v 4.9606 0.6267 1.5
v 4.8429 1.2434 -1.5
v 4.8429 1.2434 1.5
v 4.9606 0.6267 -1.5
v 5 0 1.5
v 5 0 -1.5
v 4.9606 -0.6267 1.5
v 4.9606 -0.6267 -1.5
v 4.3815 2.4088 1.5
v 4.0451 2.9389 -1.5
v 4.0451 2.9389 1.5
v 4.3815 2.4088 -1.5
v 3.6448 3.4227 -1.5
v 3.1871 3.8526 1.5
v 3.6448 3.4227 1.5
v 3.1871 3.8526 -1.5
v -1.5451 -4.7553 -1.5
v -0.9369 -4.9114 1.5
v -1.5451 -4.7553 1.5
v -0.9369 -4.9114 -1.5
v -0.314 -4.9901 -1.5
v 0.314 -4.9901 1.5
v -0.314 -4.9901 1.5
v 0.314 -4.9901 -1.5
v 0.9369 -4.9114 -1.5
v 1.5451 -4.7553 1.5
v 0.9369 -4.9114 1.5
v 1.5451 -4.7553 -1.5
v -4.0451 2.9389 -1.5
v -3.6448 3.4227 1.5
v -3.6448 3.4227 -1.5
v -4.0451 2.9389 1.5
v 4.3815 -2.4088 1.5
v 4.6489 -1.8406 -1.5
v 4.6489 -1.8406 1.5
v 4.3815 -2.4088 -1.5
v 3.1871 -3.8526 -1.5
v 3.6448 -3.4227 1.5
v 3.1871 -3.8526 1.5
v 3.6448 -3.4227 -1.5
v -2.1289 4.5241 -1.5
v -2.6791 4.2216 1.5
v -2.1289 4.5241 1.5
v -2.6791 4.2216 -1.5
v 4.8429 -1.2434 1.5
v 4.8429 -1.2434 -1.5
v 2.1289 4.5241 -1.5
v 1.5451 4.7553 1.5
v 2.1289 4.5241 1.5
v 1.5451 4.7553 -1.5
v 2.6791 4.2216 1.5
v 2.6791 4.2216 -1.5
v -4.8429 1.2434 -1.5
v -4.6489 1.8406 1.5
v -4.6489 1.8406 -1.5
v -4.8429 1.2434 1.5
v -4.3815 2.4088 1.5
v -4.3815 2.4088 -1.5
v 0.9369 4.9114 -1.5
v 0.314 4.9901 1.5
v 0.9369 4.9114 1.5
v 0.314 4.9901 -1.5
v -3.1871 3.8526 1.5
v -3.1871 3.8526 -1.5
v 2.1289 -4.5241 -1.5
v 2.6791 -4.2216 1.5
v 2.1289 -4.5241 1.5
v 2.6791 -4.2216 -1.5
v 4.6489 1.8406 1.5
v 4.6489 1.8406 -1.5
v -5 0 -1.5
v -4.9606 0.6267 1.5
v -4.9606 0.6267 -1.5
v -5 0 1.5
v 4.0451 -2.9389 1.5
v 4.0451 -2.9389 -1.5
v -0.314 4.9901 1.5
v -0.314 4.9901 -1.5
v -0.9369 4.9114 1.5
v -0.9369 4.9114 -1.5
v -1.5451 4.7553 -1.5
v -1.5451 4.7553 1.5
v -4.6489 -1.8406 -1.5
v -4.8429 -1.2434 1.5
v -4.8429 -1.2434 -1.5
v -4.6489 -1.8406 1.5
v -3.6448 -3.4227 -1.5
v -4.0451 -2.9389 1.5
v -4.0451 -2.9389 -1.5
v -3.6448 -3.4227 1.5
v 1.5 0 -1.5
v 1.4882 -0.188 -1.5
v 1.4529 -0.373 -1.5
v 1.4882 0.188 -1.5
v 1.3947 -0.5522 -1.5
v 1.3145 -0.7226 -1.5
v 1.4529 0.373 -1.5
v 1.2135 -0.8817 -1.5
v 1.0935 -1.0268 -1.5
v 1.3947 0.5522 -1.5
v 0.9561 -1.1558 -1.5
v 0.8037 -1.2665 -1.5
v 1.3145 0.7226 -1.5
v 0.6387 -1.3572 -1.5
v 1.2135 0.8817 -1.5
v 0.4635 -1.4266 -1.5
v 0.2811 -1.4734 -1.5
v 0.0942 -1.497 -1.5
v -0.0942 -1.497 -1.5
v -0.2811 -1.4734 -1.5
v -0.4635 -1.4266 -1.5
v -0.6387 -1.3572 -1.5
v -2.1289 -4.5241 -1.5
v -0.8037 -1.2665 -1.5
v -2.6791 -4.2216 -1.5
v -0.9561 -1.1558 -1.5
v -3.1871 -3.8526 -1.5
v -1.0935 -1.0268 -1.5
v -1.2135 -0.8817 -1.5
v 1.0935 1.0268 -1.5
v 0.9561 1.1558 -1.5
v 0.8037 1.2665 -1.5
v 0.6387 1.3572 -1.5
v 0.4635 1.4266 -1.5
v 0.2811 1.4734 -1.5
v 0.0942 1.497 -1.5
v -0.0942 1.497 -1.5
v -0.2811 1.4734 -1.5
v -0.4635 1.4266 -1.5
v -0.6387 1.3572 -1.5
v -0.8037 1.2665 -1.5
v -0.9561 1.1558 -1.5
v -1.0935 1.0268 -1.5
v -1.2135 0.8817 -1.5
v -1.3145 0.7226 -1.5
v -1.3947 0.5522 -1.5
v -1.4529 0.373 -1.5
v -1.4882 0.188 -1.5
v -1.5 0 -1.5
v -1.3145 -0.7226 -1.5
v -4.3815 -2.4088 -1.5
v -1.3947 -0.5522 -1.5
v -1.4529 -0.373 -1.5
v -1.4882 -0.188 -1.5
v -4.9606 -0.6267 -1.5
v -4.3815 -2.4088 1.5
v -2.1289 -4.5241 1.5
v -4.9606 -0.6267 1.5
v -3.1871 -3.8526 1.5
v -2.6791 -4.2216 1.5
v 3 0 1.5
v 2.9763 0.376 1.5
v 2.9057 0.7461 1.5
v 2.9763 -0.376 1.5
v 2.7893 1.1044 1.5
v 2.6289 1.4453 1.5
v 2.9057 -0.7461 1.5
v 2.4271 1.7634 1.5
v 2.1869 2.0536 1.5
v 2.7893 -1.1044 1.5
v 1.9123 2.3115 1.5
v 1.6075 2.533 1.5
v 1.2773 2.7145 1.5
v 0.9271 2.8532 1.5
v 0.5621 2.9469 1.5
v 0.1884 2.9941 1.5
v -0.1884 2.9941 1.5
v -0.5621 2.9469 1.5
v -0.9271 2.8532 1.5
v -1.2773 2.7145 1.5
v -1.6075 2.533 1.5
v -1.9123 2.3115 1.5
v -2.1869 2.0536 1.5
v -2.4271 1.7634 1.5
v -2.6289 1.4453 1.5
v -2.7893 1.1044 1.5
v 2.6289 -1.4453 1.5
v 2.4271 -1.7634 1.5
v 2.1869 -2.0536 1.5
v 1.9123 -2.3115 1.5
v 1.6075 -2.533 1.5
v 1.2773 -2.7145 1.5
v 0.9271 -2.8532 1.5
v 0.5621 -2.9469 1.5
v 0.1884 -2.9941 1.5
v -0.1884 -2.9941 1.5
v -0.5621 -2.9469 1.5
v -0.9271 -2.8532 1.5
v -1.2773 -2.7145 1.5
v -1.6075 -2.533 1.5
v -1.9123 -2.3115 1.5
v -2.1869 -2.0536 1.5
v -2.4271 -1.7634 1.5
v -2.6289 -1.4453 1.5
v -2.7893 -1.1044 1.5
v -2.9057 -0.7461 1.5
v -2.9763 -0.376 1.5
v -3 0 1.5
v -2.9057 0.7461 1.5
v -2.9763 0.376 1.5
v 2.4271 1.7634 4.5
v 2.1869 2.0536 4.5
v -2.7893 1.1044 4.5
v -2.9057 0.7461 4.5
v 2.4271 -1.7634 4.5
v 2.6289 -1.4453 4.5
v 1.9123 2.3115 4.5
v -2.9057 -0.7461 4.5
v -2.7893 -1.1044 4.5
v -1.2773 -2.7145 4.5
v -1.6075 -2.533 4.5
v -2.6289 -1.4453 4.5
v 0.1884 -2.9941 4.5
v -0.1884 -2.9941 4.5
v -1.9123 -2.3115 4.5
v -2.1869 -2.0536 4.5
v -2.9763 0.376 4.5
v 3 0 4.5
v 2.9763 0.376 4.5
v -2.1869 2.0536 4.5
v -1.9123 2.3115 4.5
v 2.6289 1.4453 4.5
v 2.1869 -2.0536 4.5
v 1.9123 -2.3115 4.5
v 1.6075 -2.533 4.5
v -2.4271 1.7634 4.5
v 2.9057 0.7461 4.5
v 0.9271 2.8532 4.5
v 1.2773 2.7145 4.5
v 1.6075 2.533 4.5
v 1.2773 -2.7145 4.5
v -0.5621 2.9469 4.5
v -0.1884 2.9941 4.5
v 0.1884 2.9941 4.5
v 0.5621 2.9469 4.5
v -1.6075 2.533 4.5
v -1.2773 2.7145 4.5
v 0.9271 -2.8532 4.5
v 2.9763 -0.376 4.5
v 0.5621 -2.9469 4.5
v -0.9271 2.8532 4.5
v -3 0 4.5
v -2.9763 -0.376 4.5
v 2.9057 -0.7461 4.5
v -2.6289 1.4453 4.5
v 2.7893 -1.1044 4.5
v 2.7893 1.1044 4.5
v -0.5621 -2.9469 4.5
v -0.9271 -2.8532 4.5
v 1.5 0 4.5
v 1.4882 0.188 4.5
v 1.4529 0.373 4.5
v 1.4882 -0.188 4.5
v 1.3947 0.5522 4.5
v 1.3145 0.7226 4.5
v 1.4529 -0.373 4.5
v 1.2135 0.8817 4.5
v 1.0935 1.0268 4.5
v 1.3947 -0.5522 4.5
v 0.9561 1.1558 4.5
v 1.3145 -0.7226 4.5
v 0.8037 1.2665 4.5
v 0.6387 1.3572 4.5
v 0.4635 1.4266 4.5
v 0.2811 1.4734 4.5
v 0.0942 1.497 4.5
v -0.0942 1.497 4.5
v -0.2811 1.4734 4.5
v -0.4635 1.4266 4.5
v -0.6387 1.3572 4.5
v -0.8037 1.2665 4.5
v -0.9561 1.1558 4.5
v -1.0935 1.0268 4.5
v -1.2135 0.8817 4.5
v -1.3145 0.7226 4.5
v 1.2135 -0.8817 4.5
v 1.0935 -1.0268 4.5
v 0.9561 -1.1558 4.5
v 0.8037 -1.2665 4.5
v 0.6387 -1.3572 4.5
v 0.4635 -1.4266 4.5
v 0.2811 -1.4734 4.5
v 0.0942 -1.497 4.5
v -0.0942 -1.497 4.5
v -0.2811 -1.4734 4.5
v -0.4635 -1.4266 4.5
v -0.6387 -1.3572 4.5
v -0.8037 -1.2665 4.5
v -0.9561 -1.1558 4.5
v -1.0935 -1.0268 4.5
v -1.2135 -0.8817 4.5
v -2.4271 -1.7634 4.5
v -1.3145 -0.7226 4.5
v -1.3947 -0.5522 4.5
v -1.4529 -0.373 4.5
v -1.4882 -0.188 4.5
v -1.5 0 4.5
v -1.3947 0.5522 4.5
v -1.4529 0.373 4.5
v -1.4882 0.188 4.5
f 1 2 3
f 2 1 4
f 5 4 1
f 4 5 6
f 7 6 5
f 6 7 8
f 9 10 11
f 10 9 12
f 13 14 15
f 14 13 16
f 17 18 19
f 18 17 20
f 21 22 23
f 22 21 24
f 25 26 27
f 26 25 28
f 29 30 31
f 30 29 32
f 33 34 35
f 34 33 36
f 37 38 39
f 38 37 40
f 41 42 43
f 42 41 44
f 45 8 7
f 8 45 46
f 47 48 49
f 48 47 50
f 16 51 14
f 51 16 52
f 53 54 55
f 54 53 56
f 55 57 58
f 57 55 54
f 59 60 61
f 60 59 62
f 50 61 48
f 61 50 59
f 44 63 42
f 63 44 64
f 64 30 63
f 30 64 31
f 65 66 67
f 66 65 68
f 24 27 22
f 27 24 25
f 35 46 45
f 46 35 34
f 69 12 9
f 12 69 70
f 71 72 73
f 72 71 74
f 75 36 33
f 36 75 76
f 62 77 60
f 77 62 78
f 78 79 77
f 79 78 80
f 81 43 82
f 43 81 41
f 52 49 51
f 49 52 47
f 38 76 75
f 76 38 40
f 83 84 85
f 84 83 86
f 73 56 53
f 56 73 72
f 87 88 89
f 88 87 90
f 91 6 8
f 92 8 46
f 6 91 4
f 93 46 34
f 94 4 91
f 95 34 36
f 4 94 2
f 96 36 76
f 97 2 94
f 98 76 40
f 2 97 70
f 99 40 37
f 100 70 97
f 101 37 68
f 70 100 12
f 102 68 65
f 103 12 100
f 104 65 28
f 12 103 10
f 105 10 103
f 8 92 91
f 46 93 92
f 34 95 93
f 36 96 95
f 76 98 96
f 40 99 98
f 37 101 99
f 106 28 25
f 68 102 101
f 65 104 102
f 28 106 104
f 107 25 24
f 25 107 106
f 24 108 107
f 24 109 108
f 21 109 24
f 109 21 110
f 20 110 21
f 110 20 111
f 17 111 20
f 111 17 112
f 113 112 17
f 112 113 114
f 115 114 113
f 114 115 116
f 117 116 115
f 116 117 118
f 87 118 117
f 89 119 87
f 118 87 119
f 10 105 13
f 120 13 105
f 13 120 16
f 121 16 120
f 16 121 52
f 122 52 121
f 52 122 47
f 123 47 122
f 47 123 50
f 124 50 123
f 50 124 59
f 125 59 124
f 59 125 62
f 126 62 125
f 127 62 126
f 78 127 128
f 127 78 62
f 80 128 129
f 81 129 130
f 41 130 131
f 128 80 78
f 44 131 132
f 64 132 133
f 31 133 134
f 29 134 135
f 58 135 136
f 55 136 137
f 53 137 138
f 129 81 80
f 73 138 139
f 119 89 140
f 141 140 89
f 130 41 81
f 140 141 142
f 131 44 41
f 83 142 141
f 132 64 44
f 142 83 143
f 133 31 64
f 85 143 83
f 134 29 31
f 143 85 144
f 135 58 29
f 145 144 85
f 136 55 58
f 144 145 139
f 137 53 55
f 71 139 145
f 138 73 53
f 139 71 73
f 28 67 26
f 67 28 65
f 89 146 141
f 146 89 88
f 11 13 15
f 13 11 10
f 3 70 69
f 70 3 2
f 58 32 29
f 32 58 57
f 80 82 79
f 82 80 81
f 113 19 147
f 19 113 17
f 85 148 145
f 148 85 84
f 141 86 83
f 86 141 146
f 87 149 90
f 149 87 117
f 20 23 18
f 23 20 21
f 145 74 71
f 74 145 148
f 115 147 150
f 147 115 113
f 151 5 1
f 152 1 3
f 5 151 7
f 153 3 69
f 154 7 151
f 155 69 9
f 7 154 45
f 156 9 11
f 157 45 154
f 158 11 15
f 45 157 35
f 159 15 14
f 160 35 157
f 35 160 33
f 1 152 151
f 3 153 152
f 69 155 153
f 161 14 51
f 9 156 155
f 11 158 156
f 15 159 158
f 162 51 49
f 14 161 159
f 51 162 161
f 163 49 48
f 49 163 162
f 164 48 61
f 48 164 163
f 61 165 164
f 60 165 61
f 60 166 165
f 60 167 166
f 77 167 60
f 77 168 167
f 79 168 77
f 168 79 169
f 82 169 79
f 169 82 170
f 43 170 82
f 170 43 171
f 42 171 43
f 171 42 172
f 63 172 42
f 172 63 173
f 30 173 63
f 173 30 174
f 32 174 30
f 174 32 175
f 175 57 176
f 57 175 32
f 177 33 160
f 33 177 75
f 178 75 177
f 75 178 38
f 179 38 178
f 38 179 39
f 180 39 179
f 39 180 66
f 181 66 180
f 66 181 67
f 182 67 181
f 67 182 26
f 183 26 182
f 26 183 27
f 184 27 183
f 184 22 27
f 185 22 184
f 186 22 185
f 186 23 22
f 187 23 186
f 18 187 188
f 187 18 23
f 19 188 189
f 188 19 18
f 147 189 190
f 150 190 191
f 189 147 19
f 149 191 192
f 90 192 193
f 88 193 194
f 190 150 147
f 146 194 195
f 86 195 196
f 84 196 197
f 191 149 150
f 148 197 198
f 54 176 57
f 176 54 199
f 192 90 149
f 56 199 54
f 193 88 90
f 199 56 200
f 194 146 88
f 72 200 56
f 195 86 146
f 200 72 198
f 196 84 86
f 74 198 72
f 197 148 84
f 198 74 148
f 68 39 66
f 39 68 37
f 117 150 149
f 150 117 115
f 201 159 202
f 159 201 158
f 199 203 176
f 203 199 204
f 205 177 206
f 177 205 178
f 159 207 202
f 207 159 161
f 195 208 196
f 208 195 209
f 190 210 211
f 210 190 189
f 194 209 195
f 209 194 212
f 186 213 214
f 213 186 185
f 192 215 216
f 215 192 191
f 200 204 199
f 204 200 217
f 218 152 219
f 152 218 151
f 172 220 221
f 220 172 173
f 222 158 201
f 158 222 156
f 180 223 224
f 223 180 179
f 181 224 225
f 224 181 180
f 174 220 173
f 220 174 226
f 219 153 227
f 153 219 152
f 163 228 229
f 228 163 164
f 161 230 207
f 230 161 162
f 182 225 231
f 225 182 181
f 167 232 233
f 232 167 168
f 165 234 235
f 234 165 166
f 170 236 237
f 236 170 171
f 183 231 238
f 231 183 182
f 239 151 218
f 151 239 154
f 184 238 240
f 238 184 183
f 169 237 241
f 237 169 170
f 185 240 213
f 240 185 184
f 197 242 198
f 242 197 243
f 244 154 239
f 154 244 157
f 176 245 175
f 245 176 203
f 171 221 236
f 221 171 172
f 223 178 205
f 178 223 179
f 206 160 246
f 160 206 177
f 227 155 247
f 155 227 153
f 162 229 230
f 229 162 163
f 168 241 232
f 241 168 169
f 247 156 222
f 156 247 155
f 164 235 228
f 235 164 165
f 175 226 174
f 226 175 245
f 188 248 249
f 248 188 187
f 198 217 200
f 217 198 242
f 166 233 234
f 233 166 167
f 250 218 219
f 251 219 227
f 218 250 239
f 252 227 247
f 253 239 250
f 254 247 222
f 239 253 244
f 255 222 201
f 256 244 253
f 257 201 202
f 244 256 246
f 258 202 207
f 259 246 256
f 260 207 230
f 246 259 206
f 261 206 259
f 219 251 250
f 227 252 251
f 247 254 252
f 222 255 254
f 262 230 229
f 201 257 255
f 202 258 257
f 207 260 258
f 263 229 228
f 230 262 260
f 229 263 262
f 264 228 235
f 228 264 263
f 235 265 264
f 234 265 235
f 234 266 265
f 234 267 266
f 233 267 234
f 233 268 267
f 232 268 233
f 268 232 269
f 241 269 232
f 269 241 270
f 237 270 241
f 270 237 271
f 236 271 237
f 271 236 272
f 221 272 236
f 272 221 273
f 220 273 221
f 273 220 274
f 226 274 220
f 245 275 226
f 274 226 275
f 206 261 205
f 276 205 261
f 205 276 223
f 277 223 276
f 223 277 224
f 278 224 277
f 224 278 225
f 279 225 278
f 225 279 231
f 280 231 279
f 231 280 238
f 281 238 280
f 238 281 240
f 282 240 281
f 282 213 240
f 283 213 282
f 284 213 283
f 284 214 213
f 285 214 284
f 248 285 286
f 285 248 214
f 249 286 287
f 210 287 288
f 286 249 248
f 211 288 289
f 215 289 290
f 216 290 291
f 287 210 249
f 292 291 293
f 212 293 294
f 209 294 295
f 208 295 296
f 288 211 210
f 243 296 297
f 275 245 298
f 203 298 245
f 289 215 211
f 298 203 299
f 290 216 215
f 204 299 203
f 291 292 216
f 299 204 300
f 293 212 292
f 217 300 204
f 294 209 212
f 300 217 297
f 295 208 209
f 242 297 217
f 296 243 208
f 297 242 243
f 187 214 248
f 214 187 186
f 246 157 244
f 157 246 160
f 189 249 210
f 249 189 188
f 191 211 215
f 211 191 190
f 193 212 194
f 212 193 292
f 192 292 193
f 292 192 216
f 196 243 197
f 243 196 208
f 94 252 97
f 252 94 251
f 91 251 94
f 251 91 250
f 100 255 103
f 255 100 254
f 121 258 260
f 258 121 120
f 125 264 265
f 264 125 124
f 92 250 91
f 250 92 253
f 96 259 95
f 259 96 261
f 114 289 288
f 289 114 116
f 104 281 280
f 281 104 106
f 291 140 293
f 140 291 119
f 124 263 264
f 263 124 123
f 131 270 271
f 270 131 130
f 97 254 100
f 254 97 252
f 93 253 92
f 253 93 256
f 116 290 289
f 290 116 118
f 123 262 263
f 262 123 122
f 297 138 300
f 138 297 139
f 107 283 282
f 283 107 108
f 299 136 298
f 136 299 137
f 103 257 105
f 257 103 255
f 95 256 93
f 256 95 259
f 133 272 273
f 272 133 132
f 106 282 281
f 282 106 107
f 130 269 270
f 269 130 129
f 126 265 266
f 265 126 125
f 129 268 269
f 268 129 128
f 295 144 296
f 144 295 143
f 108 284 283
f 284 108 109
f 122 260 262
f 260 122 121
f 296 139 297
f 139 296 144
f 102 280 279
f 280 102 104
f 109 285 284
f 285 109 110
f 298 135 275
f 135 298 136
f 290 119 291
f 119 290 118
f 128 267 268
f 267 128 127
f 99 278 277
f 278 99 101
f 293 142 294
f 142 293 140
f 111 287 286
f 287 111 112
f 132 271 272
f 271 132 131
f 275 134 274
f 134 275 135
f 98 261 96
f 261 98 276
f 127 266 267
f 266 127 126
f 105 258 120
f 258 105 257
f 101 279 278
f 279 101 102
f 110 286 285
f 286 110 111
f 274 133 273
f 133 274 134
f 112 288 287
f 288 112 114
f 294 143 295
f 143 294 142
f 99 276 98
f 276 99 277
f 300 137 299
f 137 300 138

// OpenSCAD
$fn = 50;


difference() {
	union() {
		translate(v = [0, 0, -1.5000000000]) {
			rotate(a = [0, 0, 0]) {
				cylinder(h = 3, r = 5.0000000000);
			}
		}
		translate(v = [0, 0, -1.5000000000]) {
			rotate(a = [0, 0, 0]) {
				cylinder(h = 6, r = 3.0000000000);
			}
		}
	}
	union() {
		translate(v = [0, 0, -125.0000000000]) {
			rotate(a = [0, 0, 0]) {
				cylinder(h = 250, r = 1.5000000000);
			}
		}
	}
}
